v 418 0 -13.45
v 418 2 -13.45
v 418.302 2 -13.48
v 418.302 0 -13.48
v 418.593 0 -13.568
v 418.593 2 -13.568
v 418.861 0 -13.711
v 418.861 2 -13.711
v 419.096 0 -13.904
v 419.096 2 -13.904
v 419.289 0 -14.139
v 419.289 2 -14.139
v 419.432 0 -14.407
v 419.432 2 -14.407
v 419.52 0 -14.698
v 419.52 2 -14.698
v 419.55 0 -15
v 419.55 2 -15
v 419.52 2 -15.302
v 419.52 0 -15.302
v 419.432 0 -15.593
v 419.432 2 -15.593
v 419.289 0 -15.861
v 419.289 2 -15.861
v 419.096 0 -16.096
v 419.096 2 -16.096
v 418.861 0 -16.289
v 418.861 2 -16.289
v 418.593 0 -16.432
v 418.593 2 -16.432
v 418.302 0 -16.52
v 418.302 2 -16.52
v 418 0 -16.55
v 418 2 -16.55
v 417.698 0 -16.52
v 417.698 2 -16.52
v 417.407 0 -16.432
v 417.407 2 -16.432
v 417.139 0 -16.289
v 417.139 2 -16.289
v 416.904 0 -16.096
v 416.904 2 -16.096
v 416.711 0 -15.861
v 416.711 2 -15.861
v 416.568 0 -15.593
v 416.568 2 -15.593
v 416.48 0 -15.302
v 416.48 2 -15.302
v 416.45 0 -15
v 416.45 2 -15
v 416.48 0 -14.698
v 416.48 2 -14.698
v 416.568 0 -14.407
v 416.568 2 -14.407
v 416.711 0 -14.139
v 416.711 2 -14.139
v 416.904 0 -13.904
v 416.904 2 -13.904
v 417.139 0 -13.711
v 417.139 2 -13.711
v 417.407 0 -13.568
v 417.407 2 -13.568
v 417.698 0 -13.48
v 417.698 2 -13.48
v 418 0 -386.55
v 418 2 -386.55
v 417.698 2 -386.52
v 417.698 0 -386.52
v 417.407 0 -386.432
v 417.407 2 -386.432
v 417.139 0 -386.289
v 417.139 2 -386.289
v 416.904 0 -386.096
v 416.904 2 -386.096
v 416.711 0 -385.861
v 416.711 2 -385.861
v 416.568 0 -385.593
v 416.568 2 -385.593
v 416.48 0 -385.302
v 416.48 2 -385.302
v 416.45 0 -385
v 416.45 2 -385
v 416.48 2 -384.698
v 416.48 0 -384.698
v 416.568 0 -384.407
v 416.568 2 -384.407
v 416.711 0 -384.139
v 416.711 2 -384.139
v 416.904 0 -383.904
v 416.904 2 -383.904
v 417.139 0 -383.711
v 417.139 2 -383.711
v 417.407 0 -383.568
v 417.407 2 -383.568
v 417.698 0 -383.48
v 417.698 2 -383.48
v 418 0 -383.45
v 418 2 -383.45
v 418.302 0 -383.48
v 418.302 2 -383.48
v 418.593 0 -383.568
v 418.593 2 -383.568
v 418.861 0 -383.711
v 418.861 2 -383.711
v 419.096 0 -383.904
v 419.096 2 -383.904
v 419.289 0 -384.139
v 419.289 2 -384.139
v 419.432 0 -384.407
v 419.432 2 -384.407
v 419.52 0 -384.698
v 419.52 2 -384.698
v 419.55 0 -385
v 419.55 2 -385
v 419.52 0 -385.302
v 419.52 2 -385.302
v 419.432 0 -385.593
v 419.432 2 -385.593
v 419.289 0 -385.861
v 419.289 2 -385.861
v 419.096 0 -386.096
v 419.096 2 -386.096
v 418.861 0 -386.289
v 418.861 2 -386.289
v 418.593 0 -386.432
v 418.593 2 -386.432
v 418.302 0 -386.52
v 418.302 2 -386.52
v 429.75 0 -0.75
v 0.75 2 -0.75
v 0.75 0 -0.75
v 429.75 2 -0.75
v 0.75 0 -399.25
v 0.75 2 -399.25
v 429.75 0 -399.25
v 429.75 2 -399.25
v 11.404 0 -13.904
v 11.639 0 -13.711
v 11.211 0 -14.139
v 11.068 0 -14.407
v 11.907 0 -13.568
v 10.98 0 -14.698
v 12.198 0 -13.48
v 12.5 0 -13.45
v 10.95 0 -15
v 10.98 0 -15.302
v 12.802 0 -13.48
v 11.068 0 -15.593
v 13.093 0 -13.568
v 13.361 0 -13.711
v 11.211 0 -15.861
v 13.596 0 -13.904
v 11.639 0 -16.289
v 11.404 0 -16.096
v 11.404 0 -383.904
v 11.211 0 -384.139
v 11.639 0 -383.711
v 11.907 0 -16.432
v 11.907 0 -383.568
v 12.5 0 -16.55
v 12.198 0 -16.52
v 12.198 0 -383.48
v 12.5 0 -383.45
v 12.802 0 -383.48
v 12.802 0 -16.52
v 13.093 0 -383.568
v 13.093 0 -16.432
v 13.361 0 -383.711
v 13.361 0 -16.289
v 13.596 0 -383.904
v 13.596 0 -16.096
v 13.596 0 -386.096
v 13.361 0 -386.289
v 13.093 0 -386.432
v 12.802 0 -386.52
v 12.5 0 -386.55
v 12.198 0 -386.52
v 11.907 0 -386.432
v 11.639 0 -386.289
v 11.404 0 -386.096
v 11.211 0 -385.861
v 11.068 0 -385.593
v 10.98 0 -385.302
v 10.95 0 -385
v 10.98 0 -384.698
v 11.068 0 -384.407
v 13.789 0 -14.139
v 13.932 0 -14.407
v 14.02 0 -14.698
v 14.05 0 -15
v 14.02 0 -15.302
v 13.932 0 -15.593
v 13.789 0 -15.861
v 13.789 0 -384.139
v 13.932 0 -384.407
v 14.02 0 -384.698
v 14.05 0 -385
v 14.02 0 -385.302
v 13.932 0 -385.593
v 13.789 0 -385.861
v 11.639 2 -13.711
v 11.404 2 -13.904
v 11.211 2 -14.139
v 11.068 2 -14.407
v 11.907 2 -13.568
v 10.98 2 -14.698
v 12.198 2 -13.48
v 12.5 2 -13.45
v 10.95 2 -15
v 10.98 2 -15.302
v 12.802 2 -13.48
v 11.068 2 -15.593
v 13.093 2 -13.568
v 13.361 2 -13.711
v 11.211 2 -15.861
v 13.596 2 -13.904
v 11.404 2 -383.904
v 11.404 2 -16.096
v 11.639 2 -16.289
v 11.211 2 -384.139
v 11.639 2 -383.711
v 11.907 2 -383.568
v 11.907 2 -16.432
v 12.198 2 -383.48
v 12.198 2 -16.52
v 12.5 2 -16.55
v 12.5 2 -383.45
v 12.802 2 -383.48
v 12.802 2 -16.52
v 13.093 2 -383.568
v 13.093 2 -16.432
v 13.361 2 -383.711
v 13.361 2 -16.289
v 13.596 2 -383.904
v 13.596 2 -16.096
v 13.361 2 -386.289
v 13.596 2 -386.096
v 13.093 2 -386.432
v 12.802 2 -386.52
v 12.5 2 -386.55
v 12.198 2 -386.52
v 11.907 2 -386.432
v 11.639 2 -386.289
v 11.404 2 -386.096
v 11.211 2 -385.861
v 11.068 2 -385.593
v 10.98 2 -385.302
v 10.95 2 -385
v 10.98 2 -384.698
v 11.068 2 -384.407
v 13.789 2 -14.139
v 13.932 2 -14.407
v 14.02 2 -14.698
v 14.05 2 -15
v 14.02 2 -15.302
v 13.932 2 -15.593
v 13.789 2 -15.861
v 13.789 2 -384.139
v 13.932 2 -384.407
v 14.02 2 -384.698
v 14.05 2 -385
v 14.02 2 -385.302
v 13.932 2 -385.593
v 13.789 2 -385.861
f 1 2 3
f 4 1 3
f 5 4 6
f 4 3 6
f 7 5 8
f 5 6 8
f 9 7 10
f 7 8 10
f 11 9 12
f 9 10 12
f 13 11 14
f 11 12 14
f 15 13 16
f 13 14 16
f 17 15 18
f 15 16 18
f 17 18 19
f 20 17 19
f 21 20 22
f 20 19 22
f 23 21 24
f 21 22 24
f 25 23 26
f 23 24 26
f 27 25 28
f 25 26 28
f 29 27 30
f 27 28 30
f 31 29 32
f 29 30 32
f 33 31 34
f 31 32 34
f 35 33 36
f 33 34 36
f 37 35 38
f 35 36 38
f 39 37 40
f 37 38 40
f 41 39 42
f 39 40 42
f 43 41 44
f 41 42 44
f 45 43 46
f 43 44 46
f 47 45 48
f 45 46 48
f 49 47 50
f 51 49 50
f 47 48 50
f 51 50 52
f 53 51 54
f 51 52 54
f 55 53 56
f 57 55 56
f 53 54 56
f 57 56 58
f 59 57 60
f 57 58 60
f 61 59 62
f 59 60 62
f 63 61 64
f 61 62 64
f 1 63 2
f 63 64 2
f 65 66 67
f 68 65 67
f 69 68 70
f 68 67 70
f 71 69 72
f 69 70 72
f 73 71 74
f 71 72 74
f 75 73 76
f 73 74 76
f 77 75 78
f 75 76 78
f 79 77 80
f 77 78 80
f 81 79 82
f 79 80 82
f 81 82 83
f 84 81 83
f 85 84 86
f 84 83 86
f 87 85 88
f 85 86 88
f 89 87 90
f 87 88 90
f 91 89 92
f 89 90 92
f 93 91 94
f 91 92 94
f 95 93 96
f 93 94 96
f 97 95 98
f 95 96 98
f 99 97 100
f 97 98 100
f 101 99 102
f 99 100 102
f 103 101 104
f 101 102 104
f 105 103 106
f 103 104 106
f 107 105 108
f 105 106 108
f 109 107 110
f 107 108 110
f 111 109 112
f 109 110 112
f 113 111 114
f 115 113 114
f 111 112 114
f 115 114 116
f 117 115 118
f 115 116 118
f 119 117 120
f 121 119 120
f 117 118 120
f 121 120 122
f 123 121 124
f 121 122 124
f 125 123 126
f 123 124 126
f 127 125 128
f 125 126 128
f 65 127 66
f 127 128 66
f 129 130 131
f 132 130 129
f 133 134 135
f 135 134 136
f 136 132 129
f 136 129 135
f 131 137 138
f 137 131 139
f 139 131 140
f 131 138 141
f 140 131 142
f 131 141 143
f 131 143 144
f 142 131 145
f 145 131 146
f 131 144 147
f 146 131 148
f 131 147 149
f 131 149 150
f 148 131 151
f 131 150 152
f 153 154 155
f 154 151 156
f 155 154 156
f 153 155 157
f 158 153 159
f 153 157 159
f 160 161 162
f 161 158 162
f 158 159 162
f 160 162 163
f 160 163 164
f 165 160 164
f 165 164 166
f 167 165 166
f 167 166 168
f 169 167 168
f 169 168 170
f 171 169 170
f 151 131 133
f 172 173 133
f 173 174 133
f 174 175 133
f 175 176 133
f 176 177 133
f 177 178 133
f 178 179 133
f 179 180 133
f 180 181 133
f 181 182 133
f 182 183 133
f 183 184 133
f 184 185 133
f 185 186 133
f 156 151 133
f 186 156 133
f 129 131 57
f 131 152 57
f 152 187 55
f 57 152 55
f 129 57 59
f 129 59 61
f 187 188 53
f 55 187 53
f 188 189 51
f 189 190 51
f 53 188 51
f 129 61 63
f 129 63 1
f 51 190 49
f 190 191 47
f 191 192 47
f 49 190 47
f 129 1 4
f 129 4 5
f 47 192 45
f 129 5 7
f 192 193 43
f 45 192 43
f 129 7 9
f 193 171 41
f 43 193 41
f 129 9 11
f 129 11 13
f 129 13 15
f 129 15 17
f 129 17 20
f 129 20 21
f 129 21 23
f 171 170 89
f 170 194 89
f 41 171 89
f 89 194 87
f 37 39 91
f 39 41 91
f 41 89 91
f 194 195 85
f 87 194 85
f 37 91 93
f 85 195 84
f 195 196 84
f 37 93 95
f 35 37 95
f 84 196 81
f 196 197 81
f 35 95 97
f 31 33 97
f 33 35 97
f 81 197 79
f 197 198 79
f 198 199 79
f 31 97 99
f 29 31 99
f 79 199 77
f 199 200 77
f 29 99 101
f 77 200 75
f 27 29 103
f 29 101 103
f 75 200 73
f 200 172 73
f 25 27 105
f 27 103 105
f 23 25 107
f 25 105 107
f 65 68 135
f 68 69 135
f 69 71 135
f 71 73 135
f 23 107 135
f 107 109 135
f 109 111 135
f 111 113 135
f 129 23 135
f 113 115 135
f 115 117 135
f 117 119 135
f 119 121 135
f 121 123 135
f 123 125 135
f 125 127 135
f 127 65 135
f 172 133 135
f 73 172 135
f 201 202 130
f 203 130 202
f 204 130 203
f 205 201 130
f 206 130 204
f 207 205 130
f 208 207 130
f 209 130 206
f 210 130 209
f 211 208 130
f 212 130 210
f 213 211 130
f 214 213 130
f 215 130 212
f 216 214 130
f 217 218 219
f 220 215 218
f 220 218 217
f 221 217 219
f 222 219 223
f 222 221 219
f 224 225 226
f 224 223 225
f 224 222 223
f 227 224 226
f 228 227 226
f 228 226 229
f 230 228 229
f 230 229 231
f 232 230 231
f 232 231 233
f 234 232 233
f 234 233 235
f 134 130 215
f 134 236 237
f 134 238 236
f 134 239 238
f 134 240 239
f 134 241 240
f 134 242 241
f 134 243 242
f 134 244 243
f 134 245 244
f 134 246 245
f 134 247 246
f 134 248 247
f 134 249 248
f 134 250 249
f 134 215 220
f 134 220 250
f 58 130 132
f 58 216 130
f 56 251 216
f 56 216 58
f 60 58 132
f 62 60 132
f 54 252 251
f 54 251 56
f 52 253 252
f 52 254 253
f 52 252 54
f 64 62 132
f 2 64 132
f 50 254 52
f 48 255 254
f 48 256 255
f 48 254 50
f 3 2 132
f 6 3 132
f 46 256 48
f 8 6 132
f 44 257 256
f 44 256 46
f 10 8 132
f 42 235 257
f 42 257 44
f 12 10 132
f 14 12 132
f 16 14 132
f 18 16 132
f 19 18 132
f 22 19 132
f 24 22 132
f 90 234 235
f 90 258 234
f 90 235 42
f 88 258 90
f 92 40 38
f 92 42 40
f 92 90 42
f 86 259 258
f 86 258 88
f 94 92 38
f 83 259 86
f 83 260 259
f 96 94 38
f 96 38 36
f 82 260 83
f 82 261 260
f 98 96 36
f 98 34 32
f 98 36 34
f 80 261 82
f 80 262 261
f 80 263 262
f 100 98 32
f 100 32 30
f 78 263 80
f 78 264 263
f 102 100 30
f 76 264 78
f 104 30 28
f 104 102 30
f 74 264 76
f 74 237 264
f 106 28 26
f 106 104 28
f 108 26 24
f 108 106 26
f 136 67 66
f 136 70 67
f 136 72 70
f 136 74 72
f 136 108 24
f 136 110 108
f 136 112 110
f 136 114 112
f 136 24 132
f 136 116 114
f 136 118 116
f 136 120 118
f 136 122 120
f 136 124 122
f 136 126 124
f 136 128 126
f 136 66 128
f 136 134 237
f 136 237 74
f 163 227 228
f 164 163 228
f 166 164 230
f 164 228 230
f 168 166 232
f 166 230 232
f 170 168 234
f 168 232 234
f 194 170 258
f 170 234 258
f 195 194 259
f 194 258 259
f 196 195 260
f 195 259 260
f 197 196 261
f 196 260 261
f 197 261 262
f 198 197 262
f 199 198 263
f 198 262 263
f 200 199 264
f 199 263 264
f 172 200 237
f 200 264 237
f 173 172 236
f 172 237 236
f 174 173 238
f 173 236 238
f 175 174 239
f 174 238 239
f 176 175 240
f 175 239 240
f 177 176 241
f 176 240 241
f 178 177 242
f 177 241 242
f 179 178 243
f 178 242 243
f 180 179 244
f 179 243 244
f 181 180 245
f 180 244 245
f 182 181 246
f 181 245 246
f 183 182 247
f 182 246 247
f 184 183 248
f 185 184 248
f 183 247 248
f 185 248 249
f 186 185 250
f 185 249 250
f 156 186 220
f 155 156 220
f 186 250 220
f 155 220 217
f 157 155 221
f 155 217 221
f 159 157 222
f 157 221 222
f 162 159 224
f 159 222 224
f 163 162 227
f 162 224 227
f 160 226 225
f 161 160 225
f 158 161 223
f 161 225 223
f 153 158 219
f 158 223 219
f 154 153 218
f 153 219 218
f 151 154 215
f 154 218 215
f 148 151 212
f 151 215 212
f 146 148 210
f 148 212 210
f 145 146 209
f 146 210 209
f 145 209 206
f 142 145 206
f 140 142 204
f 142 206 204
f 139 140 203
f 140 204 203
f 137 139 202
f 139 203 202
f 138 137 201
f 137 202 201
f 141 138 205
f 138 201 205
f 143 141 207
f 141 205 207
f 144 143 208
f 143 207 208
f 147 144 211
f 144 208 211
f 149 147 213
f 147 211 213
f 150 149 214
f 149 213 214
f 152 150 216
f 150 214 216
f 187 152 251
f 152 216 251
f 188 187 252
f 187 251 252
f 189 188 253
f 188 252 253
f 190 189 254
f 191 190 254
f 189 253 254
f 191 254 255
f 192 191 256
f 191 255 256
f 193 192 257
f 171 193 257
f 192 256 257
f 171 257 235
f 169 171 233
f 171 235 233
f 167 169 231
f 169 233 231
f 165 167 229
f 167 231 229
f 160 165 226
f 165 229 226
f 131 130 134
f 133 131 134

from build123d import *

# Parameters (mm, degrees)
CROQUIS1_W              = 430.5
CROQUIS1_H              = 400
SALIENTE_EXTRUIR1_DEPTH = 2
CROQUIS2_R              = 1.55
CORTAR_EXTRUIR1_DEPTH   = 2
CROQUIS3_W              = 430.5
CROQUIS3_H              = 400
CROQUIS3_W_2            = 429
CROQUIS3_H_2            = 398.5
CORTAR_EXTRUIR2_DEPTH   = 2


with BuildPart() as part:
    # Croquis1 → Saliente-Extruir1 (new body)
    with BuildSketch(Plane(origin=(0, 0, 0), x_dir=(1, 0, 0), z_dir=(0, 1, 0))):
        with Locations((215.25, 200)):
            Rectangle(CROQUIS1_W, CROQUIS1_H)
    extrude(amount=SALIENTE_EXTRUIR1_DEPTH)

    # Croquis2 → Cortar-Extruir1 (cut)
    with BuildSketch(Plane(origin=(0, 2, 0), x_dir=(1, 0, 0), z_dir=(0, 1, 0))):
        with Locations(Location((12.5, 385, 0), (0, 0, 270))):
            Circle(CROQUIS2_R)
        with Locations(Location((418, 385, 0), (0, 0, 90))):
            Circle(CROQUIS2_R)
        with Locations(Location((418, 15, 0), (0, 0, 270))):
            Circle(CROQUIS2_R)
        with Locations(Location((12.5, 15, 0), (0, 0, 90))):
            Circle(CROQUIS2_R)
    extrude(amount=-CORTAR_EXTRUIR1_DEPTH, mode=Mode.SUBTRACT)

    # Croquis3 → Cortar-Extruir2 (cut)
    with BuildSketch(Plane(origin=(0, 2, 0), x_dir=(1, 0, 0), z_dir=(0, 1, 0))):
        with Locations((215.25, 200)):
            Rectangle(CROQUIS3_W, CROQUIS3_H)
        with Locations((215.25, 200)):
            Rectangle(CROQUIS3_W_2, CROQUIS3_H_2, mode=Mode.SUBTRACT)
    extrude(amount=-CORTAR_EXTRUIR2_DEPTH, mode=Mode.SUBTRACT)


solid = part.part
